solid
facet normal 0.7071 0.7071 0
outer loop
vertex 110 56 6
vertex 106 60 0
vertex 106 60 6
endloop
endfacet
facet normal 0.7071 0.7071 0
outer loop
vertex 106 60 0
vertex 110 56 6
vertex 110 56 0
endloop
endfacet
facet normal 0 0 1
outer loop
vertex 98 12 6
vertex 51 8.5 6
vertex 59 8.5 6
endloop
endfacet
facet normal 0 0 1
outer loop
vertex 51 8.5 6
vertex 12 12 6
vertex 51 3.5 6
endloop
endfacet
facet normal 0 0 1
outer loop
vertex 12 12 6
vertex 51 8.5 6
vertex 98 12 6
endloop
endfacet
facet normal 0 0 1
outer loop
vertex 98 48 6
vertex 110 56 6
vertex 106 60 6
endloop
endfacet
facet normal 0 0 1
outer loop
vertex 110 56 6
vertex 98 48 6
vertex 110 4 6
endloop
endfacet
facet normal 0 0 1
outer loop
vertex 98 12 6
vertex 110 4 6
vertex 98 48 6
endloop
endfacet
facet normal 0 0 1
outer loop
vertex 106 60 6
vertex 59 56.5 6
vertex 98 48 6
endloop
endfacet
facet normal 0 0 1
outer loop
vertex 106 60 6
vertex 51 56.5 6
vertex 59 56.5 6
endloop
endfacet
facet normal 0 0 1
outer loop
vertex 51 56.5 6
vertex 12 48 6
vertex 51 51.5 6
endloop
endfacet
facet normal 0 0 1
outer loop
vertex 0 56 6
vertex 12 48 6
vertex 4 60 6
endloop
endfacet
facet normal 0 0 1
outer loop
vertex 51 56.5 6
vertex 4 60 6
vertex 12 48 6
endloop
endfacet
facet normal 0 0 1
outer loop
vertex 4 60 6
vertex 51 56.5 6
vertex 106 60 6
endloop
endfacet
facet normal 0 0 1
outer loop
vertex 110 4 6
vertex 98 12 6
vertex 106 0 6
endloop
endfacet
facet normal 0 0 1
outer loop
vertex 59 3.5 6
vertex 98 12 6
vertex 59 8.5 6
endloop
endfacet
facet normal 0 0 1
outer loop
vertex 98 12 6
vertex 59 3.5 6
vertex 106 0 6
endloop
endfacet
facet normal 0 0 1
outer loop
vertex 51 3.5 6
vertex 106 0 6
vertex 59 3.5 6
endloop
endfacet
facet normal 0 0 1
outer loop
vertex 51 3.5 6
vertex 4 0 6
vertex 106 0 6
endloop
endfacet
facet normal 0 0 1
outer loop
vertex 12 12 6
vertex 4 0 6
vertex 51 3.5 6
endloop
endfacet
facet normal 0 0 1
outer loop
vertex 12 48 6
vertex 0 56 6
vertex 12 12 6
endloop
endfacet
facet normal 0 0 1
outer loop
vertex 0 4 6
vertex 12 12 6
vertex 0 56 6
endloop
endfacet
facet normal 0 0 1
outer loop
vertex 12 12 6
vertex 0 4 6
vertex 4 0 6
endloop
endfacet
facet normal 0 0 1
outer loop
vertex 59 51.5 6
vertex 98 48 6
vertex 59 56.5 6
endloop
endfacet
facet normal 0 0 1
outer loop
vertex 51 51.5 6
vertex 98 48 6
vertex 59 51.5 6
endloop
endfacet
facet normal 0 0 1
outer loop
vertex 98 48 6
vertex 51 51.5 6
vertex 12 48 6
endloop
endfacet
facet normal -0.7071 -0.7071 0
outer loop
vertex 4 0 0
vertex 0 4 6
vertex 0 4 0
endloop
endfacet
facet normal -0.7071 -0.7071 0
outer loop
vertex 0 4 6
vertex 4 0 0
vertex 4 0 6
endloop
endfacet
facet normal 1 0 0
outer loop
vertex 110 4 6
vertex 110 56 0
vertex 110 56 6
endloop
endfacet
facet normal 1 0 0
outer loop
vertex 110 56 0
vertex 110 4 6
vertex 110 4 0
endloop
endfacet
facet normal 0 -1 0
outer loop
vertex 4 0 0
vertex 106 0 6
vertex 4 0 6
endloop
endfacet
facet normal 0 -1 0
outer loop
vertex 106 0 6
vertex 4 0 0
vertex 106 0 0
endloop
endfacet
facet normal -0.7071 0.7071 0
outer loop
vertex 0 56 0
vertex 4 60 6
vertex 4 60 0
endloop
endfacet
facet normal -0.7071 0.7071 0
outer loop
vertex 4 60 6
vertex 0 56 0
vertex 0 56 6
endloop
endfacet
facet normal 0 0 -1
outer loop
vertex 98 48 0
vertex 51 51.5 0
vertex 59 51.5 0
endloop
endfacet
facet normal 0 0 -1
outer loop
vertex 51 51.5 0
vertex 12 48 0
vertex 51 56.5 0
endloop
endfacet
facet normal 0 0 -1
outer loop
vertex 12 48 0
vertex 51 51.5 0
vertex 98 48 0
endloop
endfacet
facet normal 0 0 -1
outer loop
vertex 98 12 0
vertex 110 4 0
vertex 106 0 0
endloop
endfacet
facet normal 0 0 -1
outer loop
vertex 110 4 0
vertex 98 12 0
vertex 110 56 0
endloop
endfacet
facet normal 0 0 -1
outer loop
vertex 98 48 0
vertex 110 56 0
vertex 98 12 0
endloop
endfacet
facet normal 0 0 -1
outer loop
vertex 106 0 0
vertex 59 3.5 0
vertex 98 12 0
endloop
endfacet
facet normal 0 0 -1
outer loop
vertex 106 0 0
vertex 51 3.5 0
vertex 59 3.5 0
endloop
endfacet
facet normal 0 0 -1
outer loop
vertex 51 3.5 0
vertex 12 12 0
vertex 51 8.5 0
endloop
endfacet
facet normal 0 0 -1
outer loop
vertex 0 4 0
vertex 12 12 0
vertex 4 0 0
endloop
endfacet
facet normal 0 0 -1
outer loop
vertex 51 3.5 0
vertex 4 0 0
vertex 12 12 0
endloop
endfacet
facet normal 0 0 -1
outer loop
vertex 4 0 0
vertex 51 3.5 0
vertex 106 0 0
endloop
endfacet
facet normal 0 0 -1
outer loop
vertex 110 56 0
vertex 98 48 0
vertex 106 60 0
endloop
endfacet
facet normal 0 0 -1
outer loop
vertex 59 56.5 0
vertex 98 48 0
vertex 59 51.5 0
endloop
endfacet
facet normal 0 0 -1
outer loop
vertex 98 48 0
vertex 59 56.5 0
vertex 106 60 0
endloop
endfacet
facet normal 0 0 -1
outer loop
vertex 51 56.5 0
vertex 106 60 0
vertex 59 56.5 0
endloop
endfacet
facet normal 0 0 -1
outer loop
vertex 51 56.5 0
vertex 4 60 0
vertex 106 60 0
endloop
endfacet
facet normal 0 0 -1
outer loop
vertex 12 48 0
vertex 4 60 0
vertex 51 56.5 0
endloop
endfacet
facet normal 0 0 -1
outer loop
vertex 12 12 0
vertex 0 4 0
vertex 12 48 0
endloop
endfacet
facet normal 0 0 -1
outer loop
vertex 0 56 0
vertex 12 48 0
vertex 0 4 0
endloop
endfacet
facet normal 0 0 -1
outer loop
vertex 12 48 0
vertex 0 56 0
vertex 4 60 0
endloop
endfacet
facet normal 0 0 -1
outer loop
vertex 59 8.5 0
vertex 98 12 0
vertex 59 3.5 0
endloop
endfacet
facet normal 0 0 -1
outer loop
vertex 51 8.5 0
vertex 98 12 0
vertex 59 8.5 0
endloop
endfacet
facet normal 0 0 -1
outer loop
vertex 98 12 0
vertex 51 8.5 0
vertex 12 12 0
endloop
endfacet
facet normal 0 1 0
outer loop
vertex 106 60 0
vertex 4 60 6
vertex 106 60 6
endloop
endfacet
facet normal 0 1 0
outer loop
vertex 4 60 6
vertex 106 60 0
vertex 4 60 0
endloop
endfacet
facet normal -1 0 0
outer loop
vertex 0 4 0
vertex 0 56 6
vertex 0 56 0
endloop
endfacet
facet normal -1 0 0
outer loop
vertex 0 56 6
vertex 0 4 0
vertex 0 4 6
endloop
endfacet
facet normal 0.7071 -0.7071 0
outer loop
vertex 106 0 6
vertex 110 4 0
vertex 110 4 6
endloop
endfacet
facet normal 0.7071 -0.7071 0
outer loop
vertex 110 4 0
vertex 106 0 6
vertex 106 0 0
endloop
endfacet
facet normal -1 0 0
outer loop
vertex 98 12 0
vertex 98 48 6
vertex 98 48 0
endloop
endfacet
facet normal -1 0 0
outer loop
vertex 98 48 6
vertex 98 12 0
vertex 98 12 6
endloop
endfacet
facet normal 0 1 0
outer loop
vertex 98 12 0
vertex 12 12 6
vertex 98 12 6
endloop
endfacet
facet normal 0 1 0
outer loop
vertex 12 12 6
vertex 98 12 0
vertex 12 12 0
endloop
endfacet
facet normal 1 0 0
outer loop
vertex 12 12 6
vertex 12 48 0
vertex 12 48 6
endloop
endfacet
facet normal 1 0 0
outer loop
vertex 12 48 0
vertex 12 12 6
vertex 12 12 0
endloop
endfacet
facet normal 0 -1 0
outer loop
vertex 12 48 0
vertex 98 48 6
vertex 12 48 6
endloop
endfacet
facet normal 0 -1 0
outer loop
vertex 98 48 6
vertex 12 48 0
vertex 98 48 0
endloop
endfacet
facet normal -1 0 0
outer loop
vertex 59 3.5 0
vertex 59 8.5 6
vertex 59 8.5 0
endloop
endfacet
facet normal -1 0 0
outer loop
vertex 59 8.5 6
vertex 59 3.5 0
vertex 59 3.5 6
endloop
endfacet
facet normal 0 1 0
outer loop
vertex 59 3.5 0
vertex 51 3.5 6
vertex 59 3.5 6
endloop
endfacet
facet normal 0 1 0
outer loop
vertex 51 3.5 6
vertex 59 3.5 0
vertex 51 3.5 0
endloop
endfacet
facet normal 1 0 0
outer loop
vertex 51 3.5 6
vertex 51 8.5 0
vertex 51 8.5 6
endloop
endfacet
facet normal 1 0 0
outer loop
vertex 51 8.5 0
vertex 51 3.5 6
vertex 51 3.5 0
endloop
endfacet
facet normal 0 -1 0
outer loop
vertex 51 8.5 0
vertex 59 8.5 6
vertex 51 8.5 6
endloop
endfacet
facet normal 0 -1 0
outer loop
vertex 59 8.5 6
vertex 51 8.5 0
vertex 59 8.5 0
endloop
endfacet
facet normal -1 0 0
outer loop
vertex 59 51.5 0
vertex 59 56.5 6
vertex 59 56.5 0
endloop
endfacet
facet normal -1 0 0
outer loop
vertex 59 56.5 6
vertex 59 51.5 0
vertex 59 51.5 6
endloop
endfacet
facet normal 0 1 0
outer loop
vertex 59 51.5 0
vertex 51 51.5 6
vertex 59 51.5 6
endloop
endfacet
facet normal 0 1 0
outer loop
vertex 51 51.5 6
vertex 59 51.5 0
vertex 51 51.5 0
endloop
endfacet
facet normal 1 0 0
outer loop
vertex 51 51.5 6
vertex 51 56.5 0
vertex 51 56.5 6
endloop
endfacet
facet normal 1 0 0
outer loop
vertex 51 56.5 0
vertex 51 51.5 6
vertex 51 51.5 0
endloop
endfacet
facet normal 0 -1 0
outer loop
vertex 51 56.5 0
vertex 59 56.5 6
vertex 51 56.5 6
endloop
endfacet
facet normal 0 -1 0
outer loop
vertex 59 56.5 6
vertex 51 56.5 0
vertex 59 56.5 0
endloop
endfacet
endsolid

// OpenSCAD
$fn = 32;

// ----------------------------------------------------------------------
// Frame plate: 110 x 60 frame, 12 mm rails
// ----------------------------------------------------------------------

// --- parameters (mm) ---
plate_l = 110;            // plate length, X
plate_w = 60;             // plate width, Y
plate_t = 6;              // plate thickness, Z (extrusion height)
corner_c = 4;             // corner chamfer
frame_bar = 12;           // frame rail width
slot_l = 8;               // adjustment slot length
slot_w = 5;               // adjustment slot width

win_l = plate_l - 2 * frame_bar;  // window length
win_w = plate_w - 2 * frame_bar;  // window width

profile = [[4, 0], [106, 0], [110, 4], [110, 56], [106, 60], [4, 60], [0, 56], [0, 4]];  // primary outline, 8 points, counter clockwise
void_1 = [[12, 12], [98, 12], [98, 48], [12, 48]];  // the window, 4 points
void_2 = [[51, 3.5], [59, 3.5], [59, 8.5], [51, 8.5]];  // adjustment slot, 4 points
void_3 = [[51, 51.5], [59, 51.5], [59, 56.5], [51, 56.5]];  // adjustment slot, 4 points

// --- the one profile operation ---
difference() {
  linear_extrude(height = plate_t) polygon(points = profile);
  translate([0, 0, -1])
    linear_extrude(height = plate_t + 2) polygon(points = void_1);
  translate([0, 0, -1])
    linear_extrude(height = plate_t + 2) polygon(points = void_2);
  translate([0, 0, -1])
    linear_extrude(height = plate_t + 2) polygon(points = void_3);
}
